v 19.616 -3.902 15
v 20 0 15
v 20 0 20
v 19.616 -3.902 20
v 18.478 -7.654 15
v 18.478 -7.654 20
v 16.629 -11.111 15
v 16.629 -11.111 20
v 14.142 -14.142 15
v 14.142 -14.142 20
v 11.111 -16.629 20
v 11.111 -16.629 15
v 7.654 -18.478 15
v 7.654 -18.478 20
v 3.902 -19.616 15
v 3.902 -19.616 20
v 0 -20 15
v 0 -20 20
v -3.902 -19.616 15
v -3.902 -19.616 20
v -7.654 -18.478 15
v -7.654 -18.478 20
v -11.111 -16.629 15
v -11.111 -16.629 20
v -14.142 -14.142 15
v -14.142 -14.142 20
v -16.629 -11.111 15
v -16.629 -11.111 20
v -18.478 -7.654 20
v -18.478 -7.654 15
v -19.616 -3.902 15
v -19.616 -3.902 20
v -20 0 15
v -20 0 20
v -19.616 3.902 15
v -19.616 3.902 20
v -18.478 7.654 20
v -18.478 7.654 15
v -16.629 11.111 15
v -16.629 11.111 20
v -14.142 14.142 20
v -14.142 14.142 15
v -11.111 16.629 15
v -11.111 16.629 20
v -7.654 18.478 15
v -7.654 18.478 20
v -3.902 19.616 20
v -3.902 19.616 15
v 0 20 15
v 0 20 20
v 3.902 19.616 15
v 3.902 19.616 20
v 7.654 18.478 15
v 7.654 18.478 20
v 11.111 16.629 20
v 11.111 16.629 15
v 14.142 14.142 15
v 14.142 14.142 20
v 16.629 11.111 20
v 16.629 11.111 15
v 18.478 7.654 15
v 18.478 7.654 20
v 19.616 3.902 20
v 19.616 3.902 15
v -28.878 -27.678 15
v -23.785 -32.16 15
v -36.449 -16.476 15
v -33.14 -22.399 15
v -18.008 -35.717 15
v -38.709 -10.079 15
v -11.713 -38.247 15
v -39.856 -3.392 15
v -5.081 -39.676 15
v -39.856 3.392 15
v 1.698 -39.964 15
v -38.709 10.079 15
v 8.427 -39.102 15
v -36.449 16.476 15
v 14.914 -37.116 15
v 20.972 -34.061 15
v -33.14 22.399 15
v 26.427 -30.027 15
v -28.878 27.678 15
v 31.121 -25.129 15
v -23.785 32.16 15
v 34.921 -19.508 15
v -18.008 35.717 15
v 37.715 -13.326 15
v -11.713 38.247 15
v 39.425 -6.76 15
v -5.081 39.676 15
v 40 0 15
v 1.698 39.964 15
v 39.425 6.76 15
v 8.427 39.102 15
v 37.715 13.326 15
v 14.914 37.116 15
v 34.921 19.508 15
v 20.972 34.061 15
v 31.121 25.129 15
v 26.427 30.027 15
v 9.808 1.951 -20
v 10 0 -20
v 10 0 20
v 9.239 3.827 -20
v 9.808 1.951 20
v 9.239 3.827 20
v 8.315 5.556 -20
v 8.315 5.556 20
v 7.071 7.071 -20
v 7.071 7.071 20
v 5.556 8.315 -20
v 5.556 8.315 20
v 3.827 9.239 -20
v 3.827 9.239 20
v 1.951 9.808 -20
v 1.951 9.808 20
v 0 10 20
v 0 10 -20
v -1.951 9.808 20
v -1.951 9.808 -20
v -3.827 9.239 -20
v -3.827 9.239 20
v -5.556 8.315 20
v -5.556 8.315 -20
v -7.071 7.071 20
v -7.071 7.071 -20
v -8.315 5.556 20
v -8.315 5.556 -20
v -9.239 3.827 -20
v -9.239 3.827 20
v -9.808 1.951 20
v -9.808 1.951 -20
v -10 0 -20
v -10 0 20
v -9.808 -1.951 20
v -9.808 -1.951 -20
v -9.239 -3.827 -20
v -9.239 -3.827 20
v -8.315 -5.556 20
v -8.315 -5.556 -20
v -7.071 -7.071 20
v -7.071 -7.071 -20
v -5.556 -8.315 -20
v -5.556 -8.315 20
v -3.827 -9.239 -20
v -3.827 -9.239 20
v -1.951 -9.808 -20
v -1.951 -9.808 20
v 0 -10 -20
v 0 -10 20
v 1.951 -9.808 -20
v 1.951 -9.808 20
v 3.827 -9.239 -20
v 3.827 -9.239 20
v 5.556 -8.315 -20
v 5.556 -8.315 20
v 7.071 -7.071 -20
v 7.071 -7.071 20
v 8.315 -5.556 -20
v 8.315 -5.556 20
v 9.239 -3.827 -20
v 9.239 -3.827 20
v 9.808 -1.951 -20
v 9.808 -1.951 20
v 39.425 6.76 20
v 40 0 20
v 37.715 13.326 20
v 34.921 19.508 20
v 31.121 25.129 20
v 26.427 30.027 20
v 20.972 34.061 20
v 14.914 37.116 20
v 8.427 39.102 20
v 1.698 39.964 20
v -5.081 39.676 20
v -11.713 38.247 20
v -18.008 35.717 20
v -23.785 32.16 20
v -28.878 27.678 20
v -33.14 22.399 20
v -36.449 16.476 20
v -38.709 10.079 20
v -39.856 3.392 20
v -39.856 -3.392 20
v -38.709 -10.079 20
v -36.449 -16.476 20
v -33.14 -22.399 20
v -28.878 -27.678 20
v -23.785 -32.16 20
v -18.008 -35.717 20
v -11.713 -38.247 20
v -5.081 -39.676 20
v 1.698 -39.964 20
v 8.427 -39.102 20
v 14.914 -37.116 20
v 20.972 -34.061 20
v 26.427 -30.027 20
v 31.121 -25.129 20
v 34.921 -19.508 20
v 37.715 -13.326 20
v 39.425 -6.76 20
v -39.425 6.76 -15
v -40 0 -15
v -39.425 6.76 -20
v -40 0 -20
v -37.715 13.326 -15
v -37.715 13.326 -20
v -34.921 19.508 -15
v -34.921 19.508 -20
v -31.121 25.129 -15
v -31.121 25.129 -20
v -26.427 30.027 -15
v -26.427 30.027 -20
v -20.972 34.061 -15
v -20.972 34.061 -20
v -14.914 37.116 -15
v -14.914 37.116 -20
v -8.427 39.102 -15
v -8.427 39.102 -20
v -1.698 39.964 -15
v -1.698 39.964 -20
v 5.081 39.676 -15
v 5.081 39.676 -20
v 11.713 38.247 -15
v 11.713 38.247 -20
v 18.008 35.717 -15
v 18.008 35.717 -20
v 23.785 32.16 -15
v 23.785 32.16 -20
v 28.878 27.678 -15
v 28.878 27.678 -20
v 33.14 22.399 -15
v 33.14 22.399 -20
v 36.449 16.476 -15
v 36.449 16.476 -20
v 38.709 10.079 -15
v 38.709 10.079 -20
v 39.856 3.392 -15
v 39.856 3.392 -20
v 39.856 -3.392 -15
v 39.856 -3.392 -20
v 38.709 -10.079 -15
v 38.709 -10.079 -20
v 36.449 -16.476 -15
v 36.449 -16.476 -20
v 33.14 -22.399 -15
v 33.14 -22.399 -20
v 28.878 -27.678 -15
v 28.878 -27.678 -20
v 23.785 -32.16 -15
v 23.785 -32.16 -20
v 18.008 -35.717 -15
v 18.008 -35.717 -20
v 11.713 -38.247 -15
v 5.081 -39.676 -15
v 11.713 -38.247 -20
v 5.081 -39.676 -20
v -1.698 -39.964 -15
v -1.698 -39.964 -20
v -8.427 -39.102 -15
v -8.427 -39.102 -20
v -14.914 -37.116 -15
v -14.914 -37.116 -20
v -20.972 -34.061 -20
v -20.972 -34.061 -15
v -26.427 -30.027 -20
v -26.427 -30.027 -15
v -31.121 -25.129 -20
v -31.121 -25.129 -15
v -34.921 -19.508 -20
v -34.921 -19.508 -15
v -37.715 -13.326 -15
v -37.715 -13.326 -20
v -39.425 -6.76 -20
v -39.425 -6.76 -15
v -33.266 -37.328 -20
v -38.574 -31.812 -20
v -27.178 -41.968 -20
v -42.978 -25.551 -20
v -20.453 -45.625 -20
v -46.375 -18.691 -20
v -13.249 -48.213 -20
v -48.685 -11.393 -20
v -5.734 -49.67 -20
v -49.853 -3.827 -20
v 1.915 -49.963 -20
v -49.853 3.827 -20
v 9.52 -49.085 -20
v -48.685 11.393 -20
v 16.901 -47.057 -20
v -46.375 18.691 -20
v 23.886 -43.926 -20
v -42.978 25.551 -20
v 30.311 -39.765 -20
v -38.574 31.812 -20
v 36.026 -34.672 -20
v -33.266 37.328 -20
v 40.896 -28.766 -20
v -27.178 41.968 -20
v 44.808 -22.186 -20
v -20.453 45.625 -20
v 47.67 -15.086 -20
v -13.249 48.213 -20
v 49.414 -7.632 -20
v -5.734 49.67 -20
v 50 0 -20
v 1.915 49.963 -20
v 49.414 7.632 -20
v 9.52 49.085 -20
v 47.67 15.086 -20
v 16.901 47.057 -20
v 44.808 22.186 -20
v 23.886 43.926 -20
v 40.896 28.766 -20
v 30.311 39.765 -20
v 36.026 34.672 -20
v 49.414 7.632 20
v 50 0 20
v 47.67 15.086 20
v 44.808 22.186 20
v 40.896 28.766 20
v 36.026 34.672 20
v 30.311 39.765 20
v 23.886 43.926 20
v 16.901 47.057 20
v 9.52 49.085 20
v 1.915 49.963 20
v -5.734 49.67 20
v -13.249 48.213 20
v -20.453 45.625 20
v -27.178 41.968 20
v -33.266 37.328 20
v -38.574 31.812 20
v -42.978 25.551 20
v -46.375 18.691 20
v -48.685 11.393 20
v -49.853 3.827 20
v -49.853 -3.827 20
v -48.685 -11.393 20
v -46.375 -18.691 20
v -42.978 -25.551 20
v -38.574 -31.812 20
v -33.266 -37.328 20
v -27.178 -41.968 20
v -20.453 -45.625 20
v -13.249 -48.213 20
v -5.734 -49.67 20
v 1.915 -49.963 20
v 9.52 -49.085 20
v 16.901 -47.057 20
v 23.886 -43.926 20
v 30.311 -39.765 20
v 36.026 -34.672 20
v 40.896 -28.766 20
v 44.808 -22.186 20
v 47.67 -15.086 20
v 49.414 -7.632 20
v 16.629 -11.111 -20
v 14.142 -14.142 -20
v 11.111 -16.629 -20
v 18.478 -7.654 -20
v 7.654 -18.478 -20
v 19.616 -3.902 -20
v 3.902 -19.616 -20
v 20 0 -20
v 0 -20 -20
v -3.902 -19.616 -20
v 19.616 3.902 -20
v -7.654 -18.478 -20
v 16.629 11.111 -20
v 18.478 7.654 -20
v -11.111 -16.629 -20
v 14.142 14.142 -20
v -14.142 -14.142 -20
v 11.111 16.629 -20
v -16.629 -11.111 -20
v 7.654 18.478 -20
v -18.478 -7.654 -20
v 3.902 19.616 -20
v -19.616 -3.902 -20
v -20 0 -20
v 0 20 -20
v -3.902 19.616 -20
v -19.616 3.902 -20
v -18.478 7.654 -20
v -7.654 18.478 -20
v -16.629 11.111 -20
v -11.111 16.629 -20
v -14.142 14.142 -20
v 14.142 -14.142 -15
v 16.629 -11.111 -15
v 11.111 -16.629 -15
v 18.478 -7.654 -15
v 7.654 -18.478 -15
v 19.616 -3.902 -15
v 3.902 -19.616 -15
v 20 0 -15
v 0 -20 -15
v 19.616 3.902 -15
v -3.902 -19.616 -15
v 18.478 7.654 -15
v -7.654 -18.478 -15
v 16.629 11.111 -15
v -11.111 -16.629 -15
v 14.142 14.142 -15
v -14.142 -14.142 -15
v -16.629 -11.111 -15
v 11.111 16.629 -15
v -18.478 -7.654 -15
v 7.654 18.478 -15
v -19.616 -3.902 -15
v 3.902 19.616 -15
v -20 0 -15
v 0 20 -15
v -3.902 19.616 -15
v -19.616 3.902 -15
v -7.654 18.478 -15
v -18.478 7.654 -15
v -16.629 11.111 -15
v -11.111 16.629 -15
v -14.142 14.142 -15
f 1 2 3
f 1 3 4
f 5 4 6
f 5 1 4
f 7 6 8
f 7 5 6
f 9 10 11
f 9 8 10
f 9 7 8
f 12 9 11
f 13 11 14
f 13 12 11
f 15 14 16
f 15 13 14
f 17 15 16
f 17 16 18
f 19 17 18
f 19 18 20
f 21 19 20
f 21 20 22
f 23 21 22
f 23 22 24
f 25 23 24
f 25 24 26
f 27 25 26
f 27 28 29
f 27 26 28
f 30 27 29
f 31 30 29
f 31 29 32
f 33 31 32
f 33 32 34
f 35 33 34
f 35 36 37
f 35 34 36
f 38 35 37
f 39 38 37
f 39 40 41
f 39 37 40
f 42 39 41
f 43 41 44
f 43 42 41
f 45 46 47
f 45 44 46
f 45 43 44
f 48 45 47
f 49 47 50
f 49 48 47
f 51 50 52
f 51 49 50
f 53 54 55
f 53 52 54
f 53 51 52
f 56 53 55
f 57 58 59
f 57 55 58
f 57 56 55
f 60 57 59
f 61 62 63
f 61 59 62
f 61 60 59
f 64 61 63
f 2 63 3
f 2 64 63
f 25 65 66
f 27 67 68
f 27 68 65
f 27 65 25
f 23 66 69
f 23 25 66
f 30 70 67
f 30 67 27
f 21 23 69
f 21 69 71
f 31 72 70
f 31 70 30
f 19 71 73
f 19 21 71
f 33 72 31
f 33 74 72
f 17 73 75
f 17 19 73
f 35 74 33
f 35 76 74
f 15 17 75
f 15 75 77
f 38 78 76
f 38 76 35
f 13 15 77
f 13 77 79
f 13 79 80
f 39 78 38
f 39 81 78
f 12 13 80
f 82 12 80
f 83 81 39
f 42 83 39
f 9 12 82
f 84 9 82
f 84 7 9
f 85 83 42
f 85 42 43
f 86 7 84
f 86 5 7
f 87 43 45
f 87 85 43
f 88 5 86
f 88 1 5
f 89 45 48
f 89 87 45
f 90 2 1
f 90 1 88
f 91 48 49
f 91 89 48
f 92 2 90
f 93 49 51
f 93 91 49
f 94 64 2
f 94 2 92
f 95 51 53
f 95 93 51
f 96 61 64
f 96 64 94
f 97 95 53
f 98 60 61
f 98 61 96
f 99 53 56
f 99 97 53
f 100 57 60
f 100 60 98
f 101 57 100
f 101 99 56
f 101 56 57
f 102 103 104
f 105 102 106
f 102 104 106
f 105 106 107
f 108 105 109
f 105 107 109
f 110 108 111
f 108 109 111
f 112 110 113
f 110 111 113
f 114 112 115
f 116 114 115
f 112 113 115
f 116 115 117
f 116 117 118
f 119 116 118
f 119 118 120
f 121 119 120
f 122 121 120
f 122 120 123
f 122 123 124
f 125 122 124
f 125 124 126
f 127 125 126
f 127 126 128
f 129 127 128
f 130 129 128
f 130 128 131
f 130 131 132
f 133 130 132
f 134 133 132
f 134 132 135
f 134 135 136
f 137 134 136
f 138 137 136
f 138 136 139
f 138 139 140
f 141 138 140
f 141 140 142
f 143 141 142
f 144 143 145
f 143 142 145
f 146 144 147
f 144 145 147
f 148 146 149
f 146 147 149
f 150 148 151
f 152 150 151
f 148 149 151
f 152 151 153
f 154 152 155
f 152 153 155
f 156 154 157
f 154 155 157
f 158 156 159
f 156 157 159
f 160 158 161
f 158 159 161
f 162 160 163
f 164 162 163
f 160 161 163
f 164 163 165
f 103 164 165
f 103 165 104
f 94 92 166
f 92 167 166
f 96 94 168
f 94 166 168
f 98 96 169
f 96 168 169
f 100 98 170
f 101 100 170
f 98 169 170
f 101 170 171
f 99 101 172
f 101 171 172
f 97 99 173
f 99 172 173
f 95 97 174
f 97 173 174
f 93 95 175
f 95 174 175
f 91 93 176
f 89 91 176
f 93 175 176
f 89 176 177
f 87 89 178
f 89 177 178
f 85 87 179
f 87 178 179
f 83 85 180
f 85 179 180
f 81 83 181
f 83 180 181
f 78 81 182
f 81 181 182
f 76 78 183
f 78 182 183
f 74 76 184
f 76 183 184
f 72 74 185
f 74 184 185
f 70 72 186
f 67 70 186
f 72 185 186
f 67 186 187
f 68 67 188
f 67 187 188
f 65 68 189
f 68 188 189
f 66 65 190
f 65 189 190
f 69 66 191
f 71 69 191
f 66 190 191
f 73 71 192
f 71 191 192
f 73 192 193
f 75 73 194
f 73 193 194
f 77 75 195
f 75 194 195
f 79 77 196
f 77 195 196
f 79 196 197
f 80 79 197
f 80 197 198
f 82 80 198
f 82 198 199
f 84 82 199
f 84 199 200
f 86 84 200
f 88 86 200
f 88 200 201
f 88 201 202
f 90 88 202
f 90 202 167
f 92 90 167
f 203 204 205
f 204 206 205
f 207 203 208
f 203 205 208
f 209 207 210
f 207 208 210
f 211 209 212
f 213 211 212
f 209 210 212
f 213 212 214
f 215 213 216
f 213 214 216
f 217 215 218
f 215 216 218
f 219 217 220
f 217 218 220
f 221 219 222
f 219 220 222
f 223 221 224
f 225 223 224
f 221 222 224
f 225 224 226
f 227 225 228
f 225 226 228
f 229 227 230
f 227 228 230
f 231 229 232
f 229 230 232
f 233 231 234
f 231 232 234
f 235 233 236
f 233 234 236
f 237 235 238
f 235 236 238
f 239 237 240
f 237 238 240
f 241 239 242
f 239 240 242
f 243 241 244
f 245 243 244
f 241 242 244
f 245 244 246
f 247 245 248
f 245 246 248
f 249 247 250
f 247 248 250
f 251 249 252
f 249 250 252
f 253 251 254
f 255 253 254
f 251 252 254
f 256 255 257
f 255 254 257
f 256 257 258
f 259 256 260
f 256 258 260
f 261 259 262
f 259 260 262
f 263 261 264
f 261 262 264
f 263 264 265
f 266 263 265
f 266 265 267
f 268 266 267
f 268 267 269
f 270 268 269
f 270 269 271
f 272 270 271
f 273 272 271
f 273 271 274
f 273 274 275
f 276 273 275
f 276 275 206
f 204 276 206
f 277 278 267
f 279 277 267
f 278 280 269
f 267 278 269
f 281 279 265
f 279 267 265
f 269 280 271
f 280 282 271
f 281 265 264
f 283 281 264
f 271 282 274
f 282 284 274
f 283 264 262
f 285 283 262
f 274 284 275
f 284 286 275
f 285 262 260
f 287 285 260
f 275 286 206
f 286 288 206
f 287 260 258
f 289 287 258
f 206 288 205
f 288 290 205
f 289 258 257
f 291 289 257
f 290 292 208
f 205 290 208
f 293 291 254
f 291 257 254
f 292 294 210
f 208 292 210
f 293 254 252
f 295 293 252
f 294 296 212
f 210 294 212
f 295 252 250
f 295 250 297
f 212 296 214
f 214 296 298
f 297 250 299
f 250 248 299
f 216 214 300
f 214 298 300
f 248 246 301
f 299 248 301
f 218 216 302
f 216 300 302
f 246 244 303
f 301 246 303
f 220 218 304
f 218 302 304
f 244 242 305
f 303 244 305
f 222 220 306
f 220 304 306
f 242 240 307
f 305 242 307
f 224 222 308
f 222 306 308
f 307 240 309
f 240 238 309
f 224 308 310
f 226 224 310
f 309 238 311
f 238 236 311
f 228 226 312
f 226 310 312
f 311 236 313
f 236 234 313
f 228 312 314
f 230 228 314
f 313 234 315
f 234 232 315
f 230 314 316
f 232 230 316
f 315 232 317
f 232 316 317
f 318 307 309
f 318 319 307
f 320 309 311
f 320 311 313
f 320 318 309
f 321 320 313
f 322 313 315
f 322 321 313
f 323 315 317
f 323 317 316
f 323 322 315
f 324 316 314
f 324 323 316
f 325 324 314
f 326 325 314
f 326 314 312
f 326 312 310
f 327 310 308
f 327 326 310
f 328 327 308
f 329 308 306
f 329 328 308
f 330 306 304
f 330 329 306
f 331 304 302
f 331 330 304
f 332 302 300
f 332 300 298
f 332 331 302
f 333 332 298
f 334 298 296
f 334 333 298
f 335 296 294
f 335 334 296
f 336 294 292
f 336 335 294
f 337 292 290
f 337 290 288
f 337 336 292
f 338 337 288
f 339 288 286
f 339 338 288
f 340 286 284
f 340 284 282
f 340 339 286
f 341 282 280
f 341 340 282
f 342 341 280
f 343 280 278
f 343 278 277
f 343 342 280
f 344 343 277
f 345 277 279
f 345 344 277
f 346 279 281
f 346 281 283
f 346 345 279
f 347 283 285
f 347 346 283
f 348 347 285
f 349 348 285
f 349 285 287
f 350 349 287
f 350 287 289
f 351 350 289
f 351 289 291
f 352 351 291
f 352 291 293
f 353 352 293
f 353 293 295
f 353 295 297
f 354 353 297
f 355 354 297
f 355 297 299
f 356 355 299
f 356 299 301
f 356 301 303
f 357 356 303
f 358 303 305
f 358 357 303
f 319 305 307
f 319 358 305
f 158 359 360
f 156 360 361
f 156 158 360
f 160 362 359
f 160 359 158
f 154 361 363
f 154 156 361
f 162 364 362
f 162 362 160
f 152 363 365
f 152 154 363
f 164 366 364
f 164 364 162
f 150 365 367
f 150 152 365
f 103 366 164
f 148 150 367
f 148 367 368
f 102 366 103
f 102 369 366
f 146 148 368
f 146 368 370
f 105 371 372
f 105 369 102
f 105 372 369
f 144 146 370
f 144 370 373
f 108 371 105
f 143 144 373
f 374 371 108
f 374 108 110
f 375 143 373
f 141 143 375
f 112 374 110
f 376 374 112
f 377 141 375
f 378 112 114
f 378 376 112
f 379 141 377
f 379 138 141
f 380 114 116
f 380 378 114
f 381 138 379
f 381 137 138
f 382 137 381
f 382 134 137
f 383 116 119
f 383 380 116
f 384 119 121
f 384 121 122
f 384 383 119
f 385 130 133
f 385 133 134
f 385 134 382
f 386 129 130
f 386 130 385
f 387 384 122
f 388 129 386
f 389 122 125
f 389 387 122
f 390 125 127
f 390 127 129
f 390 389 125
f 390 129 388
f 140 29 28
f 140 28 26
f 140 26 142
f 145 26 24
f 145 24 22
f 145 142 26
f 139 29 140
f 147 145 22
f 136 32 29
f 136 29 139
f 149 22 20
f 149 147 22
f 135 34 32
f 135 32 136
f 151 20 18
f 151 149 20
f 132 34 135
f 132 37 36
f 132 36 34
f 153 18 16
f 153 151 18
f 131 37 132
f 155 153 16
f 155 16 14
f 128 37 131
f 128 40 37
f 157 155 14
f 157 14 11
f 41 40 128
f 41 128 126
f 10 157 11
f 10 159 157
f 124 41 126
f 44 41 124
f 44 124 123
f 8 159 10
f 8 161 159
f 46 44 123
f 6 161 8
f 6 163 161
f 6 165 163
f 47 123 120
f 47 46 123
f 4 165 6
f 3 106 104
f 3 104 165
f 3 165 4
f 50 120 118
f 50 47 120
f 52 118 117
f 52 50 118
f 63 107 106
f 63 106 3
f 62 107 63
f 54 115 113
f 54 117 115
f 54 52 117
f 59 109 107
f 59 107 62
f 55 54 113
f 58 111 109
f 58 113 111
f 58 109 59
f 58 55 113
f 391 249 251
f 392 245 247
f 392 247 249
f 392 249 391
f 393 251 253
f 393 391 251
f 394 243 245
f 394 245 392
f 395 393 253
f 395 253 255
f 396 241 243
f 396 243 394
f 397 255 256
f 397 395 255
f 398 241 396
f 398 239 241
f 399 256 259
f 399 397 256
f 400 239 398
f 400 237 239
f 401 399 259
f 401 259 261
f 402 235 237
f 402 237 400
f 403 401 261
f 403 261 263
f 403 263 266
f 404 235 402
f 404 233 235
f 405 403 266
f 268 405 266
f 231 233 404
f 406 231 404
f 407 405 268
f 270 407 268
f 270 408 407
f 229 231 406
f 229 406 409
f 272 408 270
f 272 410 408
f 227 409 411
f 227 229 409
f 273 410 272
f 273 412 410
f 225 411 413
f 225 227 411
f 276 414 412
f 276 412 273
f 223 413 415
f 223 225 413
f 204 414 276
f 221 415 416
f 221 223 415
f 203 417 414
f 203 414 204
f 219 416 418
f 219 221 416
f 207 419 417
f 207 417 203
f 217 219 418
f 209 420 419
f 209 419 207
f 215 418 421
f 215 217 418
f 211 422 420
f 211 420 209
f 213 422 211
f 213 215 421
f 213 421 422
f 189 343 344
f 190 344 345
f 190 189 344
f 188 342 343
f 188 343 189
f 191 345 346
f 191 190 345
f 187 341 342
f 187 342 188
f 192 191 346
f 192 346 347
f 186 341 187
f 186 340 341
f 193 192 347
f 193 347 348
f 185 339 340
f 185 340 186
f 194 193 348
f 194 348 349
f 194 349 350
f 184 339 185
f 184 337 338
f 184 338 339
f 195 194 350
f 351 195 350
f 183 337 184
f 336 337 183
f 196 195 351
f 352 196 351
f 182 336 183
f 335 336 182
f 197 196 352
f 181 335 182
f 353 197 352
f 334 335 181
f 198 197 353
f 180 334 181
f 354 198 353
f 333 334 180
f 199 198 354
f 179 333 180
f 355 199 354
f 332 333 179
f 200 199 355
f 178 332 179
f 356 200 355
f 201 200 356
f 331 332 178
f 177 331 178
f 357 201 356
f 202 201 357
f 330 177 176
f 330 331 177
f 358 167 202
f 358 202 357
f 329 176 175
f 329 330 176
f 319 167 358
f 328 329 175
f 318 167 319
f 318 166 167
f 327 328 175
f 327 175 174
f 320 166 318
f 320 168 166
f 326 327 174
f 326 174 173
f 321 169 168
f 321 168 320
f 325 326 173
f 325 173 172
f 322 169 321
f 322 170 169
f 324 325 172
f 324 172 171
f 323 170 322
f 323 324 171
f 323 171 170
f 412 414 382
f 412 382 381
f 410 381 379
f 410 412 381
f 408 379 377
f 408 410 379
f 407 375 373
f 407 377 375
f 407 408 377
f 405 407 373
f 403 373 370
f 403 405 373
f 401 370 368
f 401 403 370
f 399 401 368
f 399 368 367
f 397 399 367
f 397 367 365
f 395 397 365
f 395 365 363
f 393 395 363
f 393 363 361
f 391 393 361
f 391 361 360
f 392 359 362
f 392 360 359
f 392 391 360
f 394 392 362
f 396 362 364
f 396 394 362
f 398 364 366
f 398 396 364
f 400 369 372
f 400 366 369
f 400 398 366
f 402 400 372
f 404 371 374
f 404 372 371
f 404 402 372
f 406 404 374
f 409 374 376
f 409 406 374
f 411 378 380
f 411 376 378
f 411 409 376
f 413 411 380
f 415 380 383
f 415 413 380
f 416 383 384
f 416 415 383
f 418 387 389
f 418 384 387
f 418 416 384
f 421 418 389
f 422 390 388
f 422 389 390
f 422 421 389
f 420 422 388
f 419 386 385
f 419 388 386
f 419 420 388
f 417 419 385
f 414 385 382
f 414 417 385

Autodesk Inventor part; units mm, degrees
ref_plane "YZ Plane" through (0, 0, 0) normal (1, 0, 0) x (0, 1, 0)
ref_plane "XZ Plane" through (0, 0, 0) normal (0, 1, 0) x (-1, 0, 0)
ref_plane "XY Plane" through (0, 0, 0) normal (0, 0, 1) x (1, 0, 0)
sketch "Esboço1" plane through (0, 0, 0) normal (0, 0, 1) x (1, 0, 0)
  circle A0 centre (0, 0) radius 10
  circle A1 centre (0, 0) radius 40
  circle A2 centre (0, 0) radius 50
  dimension "d0" = 100
  dimension "d1" = 80
  dimension "d2" = 20
extrude "Extrusão1" add sketch "Esboço1" along normal mid plane 40 contours A1 | A2
sketch "Esboço2" plane through (0, 0, 20) normal (0, 0, 1) x (1, 0, 0)
  circle A0 centre (0, 0) radius 40
  dimension "d5" = 80
extrude "Extrusão2" cut sketch "Esboço2" against normal blind 5
sketch "Esboço3" plane through (0, 0, -20) normal (0, 0, -1) x (-1, 0, 0)
  circle A0 centre (0, 0) radius 40
  dimension "d8" = 80
extrude "Extrusão3" cut sketch "Esboço3" against normal blind 5
sketch "Esboço4" plane through (0, 0, 15) normal (0, 0, 1) x (1, 0, 0)
  circle A0 centre (0, 0) radius 20
  dimension "d11" = 40
extrude "Extrusão4" add sketch "Esboço4" along normal blind 5
sketch "Esboço5" plane through (0, 0, -15) normal (0, 0, -1) x (-1, 0, 0)
  circle A0 centre (0, 0) radius 20
  dimension "d14" = 40
extrude "Extrusão5" add sketch "Esboço5" along normal blind 5
sketch "Esboço6" plane through (0, 0, 20) normal (0, 0, 1) x (1, 0, 0)
  circle A0 centre (0, 0) radius 10
  dimension "d17" = 20
extrude "Extrusão6" cut sketch "Esboço6" against normal through all
properties part number "rodizio"
